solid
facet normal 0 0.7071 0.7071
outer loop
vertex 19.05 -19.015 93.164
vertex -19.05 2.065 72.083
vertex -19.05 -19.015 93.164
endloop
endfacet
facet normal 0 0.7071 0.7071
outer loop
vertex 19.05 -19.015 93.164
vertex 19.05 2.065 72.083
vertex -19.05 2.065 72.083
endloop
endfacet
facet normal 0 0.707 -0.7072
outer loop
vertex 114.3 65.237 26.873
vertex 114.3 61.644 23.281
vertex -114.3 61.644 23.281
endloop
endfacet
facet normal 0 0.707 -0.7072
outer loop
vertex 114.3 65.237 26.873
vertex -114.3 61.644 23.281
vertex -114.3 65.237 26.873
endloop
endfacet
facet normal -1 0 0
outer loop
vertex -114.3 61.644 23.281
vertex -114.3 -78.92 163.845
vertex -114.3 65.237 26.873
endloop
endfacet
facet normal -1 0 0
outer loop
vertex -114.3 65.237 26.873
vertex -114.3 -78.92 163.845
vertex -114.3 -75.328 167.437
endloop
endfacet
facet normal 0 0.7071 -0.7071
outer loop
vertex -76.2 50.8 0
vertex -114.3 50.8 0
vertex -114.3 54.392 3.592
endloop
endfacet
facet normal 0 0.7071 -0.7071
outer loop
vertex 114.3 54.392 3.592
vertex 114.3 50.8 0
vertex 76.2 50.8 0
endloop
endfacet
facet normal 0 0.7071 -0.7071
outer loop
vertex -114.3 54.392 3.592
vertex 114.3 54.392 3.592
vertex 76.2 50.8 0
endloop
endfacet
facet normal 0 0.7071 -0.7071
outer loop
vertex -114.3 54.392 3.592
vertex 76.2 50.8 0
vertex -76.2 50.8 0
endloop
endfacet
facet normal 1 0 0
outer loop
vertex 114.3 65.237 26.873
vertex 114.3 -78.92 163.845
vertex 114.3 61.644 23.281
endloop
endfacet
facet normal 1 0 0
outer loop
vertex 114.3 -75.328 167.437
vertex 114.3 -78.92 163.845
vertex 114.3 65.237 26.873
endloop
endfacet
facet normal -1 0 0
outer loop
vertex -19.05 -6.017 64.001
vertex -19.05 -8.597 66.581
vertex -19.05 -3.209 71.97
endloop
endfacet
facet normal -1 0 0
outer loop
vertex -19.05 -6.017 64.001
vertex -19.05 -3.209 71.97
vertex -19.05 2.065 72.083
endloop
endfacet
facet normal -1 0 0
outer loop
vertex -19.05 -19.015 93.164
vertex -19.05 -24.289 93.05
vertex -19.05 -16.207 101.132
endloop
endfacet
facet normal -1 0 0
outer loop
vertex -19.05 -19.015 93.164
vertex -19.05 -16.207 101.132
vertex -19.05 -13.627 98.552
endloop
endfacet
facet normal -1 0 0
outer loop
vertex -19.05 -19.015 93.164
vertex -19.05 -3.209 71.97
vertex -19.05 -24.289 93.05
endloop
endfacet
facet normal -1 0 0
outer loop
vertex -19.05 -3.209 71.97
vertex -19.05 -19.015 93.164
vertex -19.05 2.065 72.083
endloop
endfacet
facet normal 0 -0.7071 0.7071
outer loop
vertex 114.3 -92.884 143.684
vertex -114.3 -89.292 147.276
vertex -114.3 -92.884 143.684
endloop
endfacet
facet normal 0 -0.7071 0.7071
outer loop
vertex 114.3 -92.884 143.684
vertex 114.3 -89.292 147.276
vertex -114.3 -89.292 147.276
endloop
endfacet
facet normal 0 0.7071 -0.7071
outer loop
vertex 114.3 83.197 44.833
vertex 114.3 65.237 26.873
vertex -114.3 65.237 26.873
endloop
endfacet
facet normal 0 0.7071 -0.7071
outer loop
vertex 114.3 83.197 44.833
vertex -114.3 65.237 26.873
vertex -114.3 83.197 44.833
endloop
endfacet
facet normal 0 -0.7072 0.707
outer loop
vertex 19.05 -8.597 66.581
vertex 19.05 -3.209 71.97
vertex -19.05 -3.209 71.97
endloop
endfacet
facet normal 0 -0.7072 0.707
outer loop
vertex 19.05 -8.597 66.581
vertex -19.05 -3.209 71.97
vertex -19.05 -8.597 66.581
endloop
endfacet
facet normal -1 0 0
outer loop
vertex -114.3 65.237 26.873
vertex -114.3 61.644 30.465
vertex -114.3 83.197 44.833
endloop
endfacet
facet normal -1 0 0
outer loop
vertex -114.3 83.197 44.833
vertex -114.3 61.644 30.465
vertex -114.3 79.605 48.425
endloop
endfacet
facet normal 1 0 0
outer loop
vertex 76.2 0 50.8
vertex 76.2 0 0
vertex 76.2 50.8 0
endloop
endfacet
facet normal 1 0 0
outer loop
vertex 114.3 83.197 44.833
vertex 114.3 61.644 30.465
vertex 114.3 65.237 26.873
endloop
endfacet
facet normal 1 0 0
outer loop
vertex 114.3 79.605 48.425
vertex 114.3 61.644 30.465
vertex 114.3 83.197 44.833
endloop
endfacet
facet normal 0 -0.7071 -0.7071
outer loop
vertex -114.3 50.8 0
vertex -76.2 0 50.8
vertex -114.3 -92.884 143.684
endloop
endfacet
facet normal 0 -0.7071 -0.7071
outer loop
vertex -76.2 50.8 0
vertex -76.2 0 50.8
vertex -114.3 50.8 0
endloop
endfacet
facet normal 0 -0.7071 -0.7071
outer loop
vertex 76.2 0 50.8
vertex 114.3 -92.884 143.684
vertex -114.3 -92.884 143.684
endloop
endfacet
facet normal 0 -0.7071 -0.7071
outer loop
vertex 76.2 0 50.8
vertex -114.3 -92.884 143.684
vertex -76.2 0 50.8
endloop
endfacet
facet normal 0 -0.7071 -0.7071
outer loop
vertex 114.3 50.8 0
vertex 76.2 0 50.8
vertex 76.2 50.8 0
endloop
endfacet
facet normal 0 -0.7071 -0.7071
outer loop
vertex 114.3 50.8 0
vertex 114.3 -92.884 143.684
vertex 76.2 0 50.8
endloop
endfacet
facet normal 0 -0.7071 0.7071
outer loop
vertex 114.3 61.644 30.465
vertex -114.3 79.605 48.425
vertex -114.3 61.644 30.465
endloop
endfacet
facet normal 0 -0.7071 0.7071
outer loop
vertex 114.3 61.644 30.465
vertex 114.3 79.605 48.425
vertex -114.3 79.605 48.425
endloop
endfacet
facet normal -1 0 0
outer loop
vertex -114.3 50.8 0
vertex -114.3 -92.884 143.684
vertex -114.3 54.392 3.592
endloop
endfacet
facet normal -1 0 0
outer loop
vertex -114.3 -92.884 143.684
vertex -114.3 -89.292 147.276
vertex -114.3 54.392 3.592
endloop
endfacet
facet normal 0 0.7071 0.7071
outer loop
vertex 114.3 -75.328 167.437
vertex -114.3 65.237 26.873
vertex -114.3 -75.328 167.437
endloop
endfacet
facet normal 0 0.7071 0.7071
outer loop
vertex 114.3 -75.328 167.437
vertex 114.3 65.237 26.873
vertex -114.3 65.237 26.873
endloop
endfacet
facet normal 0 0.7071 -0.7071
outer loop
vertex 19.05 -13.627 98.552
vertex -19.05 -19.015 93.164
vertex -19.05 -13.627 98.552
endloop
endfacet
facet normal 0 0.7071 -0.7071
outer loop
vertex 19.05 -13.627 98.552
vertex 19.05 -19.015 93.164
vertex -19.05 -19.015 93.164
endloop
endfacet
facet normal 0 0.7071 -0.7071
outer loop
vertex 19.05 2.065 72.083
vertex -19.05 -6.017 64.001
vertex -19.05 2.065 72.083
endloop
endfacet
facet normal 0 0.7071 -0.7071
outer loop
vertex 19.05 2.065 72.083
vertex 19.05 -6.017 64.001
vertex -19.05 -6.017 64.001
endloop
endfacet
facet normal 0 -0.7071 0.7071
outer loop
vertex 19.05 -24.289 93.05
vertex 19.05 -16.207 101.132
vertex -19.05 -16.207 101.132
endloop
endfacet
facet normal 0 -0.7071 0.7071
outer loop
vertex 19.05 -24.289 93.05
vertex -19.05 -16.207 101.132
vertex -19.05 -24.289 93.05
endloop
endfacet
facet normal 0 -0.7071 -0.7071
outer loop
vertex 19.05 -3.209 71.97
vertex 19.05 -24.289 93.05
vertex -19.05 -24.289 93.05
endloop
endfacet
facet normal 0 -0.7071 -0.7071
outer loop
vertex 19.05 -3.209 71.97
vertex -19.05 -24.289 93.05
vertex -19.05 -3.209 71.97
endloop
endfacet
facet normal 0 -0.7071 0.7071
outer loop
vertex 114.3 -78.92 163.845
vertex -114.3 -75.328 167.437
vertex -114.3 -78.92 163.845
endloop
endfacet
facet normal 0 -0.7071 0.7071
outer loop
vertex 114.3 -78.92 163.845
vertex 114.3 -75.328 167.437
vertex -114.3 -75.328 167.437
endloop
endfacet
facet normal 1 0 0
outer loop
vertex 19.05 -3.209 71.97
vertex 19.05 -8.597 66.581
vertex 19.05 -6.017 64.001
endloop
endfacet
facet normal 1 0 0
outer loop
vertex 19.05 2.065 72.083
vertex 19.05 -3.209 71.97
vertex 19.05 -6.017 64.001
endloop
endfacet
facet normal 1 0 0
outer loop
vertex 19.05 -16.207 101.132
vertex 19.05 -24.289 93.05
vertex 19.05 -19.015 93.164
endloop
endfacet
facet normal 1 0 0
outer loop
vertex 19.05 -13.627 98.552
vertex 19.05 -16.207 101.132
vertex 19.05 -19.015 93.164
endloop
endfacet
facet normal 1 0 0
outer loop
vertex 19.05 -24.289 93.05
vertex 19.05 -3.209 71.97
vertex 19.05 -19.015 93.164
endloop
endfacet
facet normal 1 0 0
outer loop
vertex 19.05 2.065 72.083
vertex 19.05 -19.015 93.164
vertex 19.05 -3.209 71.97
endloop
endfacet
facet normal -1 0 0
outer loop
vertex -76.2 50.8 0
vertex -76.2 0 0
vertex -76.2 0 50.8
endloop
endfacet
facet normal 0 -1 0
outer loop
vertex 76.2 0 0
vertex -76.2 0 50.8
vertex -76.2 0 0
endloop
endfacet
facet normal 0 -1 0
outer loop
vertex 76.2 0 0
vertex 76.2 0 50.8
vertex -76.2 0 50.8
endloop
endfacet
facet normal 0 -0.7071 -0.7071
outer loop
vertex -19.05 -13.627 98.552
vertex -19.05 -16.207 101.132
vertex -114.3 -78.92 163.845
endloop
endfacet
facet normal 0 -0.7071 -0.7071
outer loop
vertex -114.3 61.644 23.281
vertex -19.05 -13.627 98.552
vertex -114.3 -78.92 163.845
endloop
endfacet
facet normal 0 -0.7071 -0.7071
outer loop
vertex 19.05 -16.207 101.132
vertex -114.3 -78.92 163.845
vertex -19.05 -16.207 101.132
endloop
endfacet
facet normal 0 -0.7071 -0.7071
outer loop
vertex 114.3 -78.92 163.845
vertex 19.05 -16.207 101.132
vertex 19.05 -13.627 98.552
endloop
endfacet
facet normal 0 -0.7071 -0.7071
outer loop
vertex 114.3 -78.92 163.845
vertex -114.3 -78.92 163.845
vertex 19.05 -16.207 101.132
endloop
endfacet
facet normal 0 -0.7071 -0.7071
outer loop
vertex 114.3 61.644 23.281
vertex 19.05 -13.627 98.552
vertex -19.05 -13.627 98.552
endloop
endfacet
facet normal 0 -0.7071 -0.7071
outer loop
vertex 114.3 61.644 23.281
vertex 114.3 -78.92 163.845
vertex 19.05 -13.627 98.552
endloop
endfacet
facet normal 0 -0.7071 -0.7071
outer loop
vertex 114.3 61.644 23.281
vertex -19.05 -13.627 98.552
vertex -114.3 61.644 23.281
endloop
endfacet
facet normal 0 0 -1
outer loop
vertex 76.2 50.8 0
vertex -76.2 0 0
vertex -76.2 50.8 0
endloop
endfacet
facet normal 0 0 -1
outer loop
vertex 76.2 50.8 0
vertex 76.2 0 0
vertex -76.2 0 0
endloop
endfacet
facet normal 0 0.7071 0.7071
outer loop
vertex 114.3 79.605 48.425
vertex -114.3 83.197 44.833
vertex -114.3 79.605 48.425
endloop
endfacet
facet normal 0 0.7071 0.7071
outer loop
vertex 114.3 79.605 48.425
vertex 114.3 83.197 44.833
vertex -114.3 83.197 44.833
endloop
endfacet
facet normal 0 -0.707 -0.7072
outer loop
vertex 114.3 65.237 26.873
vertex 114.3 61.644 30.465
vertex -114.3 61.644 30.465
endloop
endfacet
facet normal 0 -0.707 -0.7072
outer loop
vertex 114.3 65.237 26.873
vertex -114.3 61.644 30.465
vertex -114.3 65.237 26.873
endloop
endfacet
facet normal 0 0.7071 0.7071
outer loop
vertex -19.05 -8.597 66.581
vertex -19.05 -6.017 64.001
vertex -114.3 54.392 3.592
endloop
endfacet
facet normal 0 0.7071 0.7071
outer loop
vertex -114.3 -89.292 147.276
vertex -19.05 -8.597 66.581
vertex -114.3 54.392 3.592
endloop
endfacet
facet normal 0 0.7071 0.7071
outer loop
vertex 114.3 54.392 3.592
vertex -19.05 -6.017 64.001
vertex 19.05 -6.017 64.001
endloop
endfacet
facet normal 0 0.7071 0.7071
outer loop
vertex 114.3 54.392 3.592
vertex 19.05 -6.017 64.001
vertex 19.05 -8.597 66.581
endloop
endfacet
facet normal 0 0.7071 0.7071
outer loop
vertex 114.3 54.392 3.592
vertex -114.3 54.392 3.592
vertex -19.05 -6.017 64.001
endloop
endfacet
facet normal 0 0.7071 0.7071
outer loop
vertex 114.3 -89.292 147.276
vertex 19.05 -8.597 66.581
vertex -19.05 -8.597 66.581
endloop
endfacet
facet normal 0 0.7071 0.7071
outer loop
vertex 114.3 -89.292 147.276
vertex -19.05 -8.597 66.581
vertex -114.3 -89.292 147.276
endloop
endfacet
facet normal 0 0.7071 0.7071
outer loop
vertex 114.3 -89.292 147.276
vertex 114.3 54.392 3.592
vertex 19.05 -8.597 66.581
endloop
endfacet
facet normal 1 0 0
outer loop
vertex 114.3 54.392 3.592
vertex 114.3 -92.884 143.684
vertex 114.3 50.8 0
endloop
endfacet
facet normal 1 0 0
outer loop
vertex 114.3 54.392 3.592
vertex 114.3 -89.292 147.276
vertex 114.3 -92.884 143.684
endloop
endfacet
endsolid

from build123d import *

# Parameters (mm, degrees)
F1_DEPTH = 76.2
F3_DEPTH = 114.3
F5_DEPTH = 19.05
F7_DEPTH = 114.3
F9_DEPTH = 114.3


with BuildPart() as f1:
    # F0 (on Right) → F1 (new body, symmetric)
    with BuildSketch(Plane.YZ):
        Polygon((0, 0), (50.8, 0), (0, 50.8), align=None)
    extrude(amount=F1_DEPTH, both=True)

    # F2 (on Right) → F3 (join, symmetric)
    with BuildSketch(Plane.YZ):
        Polygon((-92.8840979371, 143.6840979371), (50.8, 0), (54.3921024484, 3.5921024484), (-89.2919954887, 147.2762003855), align=None)
    extrude(amount=F3_DEPTH, both=True)

    # F4 (on Right) → F5 (join, symmetric)
    with BuildSketch(Plane.YZ):
        Polygon((-19.0148921431, 93.1635580579), (-13.6267384705, 98.5517117306), (-16.2071399733, 101.1321132333), (-24.2893704822, 93.0498827244), (-3.2090356941, 71.9695479362), (-8.5971893667, 66.5813942636), (-6.0167878639, 64.0009927608), (2.065442645, 72.0832232698), align=None)
    extrude(amount=F5_DEPTH, both=True)

    # F6 (on Right) → F7 (join, symmetric)
    with BuildSketch(Plane.YZ):
        Polygon((-75.328073948, 167.4372521049), (-78.9201763964, 163.8451496565), (61.6444455203, 23.2805277398), (65.2365479687, 26.8726301882), align=None)
    extrude(amount=F7_DEPTH, both=True)


with BuildPart() as f9:
    # F8 (on Right) → F9 (new body, symmetric)
    with BuildSketch(Plane.YZ):
        Polygon((79.6049681903, 48.4252379269), (61.6444472583, 30.4647343746), (65.2365479687, 26.8726301882), (83.1970689007, 44.8331337405), align=None)
    extrude(amount=F9_DEPTH, both=True)


solid = Compound([f1.part, f9.part])
